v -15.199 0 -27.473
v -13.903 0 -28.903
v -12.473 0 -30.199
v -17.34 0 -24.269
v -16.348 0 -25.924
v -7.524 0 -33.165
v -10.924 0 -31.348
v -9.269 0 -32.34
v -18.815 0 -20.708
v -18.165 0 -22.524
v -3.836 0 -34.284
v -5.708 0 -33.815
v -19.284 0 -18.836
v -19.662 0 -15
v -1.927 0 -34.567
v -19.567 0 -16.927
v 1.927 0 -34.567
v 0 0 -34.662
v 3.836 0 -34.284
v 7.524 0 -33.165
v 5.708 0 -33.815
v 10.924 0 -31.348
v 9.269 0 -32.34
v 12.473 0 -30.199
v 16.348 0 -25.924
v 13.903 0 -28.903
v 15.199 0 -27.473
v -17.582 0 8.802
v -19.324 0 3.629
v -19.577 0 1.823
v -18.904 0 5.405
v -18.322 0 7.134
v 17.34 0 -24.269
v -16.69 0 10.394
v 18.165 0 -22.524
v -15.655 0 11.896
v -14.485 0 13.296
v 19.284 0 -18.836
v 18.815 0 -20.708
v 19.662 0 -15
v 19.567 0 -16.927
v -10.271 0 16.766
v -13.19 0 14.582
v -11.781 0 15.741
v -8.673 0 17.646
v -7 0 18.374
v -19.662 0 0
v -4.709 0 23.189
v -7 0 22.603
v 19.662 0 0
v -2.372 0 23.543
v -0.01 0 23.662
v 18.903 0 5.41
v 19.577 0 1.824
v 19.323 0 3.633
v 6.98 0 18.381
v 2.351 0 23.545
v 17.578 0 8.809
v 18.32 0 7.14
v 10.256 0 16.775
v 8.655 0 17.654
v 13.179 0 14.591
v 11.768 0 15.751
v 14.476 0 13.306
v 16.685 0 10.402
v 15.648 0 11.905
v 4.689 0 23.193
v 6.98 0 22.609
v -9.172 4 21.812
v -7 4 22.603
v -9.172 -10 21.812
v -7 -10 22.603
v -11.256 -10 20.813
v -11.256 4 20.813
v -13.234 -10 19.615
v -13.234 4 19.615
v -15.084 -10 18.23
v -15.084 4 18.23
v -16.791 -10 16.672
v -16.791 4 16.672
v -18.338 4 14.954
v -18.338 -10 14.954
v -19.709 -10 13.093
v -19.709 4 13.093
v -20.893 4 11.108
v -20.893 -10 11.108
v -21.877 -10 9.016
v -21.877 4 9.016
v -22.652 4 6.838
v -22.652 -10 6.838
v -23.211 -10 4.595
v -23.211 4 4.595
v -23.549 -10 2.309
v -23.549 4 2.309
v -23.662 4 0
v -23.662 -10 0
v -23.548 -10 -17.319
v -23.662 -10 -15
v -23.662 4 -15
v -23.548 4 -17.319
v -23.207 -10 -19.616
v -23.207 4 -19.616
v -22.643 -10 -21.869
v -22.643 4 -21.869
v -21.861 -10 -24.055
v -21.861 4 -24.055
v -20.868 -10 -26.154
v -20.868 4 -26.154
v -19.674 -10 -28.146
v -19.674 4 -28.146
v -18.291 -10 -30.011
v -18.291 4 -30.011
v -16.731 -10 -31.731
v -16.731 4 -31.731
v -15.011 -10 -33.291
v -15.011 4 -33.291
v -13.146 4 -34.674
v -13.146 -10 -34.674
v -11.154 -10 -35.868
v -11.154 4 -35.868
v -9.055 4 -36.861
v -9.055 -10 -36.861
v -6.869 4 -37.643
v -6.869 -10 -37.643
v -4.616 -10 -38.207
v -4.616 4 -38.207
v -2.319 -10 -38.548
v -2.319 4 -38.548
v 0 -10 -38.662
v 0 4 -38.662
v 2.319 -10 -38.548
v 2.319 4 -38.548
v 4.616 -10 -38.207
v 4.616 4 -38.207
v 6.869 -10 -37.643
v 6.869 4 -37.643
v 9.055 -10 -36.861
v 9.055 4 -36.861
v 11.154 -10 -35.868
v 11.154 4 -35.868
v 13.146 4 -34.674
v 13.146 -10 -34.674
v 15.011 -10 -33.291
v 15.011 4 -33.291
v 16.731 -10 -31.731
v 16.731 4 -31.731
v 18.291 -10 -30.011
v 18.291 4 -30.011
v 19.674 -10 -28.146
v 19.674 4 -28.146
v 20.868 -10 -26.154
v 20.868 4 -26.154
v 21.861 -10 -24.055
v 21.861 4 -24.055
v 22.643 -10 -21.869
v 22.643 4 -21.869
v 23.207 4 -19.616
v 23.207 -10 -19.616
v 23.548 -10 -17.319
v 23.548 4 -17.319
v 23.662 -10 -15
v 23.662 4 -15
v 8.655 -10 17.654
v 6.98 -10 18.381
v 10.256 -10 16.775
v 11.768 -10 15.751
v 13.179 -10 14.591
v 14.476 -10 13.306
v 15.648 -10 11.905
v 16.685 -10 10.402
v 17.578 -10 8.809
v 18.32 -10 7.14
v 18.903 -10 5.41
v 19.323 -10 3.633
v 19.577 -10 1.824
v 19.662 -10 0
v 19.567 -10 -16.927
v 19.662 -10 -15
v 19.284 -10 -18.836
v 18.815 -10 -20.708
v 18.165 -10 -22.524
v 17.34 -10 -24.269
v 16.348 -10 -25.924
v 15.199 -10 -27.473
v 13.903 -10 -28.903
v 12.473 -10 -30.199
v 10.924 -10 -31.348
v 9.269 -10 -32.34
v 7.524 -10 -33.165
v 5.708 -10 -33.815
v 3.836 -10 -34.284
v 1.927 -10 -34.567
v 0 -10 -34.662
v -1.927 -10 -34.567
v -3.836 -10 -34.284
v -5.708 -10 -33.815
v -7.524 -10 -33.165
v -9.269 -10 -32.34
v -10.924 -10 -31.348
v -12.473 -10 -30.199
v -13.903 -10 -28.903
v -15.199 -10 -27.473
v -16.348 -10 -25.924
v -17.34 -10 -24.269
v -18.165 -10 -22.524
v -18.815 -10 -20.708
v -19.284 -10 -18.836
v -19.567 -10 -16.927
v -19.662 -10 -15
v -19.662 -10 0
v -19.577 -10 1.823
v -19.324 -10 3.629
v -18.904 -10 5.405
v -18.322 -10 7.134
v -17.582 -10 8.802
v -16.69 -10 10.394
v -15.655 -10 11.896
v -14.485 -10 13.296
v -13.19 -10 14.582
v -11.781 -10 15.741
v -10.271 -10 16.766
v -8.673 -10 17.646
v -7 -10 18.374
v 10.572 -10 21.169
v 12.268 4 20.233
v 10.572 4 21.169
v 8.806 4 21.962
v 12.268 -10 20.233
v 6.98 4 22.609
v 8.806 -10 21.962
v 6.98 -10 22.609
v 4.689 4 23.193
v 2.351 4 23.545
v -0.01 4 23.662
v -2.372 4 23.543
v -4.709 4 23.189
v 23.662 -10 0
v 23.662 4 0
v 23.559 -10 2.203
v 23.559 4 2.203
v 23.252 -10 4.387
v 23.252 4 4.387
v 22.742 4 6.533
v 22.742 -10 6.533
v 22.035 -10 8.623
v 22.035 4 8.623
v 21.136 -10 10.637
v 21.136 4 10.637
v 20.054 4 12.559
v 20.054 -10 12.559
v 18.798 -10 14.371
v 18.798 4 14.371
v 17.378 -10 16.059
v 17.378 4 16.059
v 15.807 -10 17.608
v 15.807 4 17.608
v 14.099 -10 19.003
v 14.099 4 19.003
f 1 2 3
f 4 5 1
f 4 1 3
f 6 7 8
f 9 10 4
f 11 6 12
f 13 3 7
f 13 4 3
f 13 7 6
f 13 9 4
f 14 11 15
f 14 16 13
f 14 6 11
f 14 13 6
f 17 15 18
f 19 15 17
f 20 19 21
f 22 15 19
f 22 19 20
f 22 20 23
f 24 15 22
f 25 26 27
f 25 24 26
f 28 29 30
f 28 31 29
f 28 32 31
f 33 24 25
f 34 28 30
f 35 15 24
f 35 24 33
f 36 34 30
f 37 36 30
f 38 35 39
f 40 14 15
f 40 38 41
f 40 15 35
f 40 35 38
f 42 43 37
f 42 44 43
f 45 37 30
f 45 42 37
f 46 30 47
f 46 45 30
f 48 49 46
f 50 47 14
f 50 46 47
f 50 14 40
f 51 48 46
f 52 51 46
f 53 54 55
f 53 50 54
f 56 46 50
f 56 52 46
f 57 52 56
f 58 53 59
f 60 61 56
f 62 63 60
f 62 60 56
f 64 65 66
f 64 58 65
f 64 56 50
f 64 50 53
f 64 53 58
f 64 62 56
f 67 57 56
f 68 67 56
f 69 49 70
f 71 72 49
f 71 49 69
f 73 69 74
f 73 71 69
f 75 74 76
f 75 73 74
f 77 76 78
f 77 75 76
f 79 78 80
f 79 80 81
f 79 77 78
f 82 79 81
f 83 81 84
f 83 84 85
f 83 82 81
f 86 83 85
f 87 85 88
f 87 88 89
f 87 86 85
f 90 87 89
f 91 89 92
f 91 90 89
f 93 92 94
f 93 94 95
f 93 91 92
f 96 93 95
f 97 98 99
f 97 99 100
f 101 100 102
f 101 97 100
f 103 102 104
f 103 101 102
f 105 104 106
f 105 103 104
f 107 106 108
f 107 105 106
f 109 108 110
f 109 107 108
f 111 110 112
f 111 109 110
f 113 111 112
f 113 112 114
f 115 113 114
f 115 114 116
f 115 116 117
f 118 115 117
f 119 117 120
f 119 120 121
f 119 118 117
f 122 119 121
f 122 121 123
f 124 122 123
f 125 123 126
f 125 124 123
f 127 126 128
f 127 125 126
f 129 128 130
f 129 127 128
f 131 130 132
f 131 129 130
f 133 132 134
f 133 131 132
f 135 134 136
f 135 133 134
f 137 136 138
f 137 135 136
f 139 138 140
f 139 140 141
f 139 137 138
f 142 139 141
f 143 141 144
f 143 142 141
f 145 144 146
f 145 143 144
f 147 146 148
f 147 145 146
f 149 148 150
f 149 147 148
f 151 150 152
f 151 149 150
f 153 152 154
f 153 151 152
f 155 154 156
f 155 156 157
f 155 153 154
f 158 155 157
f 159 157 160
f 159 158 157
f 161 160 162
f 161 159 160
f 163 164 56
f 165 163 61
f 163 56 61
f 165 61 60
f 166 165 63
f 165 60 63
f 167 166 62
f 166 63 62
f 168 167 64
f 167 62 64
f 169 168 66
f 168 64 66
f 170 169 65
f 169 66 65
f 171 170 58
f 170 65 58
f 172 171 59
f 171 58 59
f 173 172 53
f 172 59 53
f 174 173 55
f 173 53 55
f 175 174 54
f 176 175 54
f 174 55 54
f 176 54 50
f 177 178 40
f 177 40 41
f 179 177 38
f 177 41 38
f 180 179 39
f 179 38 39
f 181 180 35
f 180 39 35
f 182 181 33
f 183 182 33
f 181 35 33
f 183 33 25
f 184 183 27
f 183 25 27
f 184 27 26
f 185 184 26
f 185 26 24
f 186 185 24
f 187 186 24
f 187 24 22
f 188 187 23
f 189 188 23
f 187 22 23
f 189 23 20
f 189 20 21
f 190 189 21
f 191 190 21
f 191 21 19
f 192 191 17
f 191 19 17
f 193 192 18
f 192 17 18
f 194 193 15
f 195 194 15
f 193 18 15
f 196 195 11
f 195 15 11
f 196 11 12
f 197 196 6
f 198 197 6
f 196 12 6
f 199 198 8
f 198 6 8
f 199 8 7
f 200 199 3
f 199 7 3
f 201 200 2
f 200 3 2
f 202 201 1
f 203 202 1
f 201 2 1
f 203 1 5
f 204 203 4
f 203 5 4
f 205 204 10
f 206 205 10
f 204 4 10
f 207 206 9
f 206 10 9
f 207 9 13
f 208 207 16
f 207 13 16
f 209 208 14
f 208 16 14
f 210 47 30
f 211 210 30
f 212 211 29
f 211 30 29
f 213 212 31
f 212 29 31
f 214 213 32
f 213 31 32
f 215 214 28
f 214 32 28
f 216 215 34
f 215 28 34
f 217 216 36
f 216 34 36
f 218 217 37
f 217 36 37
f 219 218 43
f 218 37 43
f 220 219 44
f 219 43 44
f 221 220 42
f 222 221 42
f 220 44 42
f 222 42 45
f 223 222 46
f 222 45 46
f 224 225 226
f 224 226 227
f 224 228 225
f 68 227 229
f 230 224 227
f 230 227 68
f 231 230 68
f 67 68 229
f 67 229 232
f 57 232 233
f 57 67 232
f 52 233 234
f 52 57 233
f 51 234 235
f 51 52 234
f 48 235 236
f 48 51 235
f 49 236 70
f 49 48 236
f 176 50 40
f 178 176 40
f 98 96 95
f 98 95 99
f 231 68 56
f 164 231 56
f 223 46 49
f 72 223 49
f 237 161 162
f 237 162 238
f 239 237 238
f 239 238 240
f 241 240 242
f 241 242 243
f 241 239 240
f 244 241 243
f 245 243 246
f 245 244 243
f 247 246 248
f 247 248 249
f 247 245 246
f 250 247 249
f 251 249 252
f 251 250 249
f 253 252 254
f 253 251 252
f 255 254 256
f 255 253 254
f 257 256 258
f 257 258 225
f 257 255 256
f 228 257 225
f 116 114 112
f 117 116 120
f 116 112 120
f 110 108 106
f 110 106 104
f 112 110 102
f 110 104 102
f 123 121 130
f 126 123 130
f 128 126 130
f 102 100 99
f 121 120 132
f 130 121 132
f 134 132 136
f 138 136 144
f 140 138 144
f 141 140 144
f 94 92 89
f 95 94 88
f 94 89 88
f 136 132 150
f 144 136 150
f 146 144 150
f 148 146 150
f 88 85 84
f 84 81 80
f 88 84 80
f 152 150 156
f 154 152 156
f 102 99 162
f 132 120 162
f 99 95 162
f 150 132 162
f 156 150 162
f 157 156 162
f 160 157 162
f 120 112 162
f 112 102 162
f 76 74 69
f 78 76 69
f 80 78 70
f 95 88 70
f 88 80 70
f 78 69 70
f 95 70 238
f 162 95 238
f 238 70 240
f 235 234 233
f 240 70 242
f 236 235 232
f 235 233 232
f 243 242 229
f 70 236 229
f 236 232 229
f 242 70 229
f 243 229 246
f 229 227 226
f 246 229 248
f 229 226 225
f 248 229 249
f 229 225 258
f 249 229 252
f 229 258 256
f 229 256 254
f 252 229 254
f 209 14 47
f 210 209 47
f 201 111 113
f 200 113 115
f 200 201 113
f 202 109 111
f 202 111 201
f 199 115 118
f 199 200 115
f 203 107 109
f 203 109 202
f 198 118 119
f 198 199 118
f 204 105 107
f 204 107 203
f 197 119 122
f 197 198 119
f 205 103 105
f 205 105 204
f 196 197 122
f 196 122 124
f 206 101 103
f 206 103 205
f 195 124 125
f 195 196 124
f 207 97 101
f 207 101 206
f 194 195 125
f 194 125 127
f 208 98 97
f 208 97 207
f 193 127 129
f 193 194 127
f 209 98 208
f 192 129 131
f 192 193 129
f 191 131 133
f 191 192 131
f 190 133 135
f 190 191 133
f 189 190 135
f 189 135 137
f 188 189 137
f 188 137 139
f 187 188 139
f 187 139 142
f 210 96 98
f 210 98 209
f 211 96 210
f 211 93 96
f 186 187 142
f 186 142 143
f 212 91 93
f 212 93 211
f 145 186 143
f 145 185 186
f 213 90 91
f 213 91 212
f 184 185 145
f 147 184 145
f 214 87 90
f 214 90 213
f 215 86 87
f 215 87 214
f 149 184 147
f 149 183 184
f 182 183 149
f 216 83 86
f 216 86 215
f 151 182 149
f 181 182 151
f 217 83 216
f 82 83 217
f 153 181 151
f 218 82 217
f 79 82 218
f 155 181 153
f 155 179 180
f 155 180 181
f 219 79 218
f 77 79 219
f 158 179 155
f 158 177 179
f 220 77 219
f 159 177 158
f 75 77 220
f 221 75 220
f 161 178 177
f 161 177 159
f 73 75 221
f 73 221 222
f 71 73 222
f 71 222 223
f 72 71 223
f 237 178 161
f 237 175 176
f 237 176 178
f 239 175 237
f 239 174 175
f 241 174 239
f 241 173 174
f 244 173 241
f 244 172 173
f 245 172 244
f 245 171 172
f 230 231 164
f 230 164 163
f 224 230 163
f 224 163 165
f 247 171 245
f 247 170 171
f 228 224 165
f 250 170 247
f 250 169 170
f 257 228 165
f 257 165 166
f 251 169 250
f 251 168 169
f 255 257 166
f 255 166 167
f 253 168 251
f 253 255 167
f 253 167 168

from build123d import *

# Parameters (mm, degrees)
F1_DEPTH = 10
F0_R     = 10
F2_DEPTH = 4


with BuildPart() as f1:
    # F0 (on Front) → F1 (new body)
    with BuildSketch(Plane.XZ):
        with BuildLine():
            Line((-19.661892, -15), (-19.661892, 0))
            ThreePointArc((-19.661892, 0), (-16.189862, 11.156988), (-7, 18.373622))
            Line((-7, 18.373622), (-7, 22.602768))
            ThreePointArc((-7, 22.602768), (-19.046238, 14.040155), (-23.661892, 0))
            Line((-23.661892, 0), (-23.661892, -15))
            ThreePointArc((-23.661892, -15), (0, -38.661892), (23.661892, -15))
            Line((23.661892, -15), (23.661892, 0))
            ThreePointArc((23.661892, 0), (20.617598, 11.610331), (12.268062, 20.233136))
            ThreePointArc((12.268062, 20.233136), (9.697053, 21.583612), (6.979972, 22.608961))
            Line((6.979972, 22.608961), (6.979972, 18.38124))
            ThreePointArc((6.979972, 18.38124), (16.18378, 11.165808), (19.661892, 0))
            Line((19.661892, 0), (19.661892, -15))
            ThreePointArc((19.661892, -15), (0, -34.661892), (-19.661892, -15))
        make_face()
    extrude(amount=F1_DEPTH)

    # F0 (on Front) → F2 (join)
    with BuildSketch(Plane.XZ):
        with BuildLine():
            Line((-19.661892, -15), (-19.661892, 0))
            ThreePointArc((-19.661892, 0), (-16.189862, 11.156988), (-7, 18.373622))
            Line((-7, 18.373622), (-7, 22.602768))
            ThreePointArc((-7, 22.602768), (-19.046238, 14.040155), (-23.661892, 0))
            Line((-23.661892, 0), (-23.661892, -15))
            ThreePointArc((-23.661892, -15), (0, -38.661892), (23.661892, -15))
            Line((23.661892, -15), (23.661892, 0))
            ThreePointArc((23.661892, 0), (20.617598, 11.610331), (12.268062, 20.233136))
            ThreePointArc((12.268062, 20.233136), (9.697053, 21.583612), (6.979972, 22.608961))
            Line((6.979972, 22.608961), (6.979972, 18.38124))
            ThreePointArc((6.979972, 18.38124), (16.18378, 11.165808), (19.661892, 0))
            Line((19.661892, 0), (19.661892, -15))
            ThreePointArc((19.661892, -15), (0, -34.661892), (-19.661892, -15))
        make_face()
        with BuildLine():
            ThreePointArc((-7, 18.373622), (-16.189862, 11.156988), (-19.661892, 0))
            Line((-19.661892, 0), (-19.661892, -15))
            ThreePointArc((-19.661892, -15), (0, -34.661892), (19.661892, -15))
            Line((19.661892, -15), (19.661892, 0))
            ThreePointArc((19.661892, 0), (16.18378, 11.165808), (6.979972, 18.38124))
            Line((6.979972, 18.38124), (6.979972, 22.608961))
            ThreePointArc((6.979972, 22.608961), (-0.010482, 23.66189), (-7, 22.602768))
            Line((-7, 22.602768), (-7, 18.373622))
        make_face()
        Circle(F0_R, mode=Mode.SUBTRACT)
        Circle(F0_R)
    extrude(amount=-F2_DEPTH)


solid = f1.part
